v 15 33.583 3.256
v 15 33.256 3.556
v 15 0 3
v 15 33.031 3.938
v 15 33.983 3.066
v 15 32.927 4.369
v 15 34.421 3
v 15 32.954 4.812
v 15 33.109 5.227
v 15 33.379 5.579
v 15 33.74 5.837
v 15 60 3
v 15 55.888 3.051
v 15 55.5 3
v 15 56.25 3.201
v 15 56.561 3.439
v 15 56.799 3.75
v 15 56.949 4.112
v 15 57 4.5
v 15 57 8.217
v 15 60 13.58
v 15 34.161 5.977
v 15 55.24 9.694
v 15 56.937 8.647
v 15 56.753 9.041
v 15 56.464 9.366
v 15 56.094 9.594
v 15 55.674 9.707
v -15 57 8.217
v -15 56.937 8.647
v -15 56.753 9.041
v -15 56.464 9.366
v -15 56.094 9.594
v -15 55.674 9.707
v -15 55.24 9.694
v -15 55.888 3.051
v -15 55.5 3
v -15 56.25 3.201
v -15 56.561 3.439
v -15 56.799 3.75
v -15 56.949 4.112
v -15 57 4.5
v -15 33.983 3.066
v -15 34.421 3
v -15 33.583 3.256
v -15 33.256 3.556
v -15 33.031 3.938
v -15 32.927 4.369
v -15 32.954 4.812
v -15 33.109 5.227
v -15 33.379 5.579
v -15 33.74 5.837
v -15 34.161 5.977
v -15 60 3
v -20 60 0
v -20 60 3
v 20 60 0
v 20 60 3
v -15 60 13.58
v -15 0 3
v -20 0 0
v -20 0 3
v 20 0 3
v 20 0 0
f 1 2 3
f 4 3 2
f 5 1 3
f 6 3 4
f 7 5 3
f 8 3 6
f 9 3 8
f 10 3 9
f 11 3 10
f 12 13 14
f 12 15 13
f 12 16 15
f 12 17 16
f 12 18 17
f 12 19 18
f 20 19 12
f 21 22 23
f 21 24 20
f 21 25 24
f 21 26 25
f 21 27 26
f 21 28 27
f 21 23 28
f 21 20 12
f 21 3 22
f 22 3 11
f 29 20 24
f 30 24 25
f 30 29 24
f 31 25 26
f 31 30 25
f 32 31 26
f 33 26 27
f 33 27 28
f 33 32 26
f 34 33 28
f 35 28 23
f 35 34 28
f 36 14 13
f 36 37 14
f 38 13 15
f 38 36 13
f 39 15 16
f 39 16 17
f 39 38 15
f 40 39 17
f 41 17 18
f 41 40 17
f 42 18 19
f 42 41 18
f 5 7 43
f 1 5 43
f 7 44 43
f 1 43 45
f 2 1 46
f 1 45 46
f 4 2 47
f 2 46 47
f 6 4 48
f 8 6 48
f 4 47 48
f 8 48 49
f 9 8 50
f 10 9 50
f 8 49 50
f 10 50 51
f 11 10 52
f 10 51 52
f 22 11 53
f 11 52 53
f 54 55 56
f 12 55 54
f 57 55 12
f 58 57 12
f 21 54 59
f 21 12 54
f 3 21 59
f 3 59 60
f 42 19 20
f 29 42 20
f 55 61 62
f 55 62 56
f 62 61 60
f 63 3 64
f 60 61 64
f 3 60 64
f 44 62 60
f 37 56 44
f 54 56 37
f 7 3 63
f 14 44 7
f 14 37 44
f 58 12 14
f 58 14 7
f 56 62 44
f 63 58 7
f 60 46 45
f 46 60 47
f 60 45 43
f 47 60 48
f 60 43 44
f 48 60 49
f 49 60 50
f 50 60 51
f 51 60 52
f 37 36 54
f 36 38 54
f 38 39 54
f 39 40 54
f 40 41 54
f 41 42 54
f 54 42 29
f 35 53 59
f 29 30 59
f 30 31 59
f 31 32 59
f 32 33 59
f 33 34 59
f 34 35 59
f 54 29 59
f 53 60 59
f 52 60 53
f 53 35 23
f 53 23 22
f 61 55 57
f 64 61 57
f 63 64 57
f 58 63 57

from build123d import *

# Parameters (mm, degrees)
F2_W          = 40
F2_H          = 60
F3_DEPTH      = 3
F5_DEPTH      = 15
F5_DEPTH_BACK = 15
F7_DEPTH      = 30
F8_R          = 1.5


with BuildPart() as f3:
    # F2 (on Top) → F3 (new body)
    with BuildSketch(Plane.XY):
        with Locations((0, 30)):
            Rectangle(F2_W, F2_H)
    extrude(amount=F3_DEPTH)

    # F4 (on Right) → F5 (join, two sides)
    with BuildSketch(Plane.YZ) as f5_sk:
        Polygon((60, 3), (60, 13.5796188425), (0, 3), align=None)
    extrude(amount=F5_DEPTH)
    extrude(f5_sk.sketch, amount=-F5_DEPTH_BACK)

    # F6 (on face) → F7 (cut, through all)
    with BuildSketch(Plane.YZ.offset(15)):
        Polygon((17.2763114494, 3), (57, 3), (57, 10.0043580647), align=None)
    extrude(amount=-F7_DEPTH, mode=Mode.SUBTRACT)

    # F8
    f8_edges = [f3.edges().sort_by_distance(p)[0] for p in [
        (0, 57, 3),
        (0, 57, 10.004358),
        (0, 17.276311, 3),
    ]]
    fillet(f8_edges, radius=F8_R)


solid = f3.part
